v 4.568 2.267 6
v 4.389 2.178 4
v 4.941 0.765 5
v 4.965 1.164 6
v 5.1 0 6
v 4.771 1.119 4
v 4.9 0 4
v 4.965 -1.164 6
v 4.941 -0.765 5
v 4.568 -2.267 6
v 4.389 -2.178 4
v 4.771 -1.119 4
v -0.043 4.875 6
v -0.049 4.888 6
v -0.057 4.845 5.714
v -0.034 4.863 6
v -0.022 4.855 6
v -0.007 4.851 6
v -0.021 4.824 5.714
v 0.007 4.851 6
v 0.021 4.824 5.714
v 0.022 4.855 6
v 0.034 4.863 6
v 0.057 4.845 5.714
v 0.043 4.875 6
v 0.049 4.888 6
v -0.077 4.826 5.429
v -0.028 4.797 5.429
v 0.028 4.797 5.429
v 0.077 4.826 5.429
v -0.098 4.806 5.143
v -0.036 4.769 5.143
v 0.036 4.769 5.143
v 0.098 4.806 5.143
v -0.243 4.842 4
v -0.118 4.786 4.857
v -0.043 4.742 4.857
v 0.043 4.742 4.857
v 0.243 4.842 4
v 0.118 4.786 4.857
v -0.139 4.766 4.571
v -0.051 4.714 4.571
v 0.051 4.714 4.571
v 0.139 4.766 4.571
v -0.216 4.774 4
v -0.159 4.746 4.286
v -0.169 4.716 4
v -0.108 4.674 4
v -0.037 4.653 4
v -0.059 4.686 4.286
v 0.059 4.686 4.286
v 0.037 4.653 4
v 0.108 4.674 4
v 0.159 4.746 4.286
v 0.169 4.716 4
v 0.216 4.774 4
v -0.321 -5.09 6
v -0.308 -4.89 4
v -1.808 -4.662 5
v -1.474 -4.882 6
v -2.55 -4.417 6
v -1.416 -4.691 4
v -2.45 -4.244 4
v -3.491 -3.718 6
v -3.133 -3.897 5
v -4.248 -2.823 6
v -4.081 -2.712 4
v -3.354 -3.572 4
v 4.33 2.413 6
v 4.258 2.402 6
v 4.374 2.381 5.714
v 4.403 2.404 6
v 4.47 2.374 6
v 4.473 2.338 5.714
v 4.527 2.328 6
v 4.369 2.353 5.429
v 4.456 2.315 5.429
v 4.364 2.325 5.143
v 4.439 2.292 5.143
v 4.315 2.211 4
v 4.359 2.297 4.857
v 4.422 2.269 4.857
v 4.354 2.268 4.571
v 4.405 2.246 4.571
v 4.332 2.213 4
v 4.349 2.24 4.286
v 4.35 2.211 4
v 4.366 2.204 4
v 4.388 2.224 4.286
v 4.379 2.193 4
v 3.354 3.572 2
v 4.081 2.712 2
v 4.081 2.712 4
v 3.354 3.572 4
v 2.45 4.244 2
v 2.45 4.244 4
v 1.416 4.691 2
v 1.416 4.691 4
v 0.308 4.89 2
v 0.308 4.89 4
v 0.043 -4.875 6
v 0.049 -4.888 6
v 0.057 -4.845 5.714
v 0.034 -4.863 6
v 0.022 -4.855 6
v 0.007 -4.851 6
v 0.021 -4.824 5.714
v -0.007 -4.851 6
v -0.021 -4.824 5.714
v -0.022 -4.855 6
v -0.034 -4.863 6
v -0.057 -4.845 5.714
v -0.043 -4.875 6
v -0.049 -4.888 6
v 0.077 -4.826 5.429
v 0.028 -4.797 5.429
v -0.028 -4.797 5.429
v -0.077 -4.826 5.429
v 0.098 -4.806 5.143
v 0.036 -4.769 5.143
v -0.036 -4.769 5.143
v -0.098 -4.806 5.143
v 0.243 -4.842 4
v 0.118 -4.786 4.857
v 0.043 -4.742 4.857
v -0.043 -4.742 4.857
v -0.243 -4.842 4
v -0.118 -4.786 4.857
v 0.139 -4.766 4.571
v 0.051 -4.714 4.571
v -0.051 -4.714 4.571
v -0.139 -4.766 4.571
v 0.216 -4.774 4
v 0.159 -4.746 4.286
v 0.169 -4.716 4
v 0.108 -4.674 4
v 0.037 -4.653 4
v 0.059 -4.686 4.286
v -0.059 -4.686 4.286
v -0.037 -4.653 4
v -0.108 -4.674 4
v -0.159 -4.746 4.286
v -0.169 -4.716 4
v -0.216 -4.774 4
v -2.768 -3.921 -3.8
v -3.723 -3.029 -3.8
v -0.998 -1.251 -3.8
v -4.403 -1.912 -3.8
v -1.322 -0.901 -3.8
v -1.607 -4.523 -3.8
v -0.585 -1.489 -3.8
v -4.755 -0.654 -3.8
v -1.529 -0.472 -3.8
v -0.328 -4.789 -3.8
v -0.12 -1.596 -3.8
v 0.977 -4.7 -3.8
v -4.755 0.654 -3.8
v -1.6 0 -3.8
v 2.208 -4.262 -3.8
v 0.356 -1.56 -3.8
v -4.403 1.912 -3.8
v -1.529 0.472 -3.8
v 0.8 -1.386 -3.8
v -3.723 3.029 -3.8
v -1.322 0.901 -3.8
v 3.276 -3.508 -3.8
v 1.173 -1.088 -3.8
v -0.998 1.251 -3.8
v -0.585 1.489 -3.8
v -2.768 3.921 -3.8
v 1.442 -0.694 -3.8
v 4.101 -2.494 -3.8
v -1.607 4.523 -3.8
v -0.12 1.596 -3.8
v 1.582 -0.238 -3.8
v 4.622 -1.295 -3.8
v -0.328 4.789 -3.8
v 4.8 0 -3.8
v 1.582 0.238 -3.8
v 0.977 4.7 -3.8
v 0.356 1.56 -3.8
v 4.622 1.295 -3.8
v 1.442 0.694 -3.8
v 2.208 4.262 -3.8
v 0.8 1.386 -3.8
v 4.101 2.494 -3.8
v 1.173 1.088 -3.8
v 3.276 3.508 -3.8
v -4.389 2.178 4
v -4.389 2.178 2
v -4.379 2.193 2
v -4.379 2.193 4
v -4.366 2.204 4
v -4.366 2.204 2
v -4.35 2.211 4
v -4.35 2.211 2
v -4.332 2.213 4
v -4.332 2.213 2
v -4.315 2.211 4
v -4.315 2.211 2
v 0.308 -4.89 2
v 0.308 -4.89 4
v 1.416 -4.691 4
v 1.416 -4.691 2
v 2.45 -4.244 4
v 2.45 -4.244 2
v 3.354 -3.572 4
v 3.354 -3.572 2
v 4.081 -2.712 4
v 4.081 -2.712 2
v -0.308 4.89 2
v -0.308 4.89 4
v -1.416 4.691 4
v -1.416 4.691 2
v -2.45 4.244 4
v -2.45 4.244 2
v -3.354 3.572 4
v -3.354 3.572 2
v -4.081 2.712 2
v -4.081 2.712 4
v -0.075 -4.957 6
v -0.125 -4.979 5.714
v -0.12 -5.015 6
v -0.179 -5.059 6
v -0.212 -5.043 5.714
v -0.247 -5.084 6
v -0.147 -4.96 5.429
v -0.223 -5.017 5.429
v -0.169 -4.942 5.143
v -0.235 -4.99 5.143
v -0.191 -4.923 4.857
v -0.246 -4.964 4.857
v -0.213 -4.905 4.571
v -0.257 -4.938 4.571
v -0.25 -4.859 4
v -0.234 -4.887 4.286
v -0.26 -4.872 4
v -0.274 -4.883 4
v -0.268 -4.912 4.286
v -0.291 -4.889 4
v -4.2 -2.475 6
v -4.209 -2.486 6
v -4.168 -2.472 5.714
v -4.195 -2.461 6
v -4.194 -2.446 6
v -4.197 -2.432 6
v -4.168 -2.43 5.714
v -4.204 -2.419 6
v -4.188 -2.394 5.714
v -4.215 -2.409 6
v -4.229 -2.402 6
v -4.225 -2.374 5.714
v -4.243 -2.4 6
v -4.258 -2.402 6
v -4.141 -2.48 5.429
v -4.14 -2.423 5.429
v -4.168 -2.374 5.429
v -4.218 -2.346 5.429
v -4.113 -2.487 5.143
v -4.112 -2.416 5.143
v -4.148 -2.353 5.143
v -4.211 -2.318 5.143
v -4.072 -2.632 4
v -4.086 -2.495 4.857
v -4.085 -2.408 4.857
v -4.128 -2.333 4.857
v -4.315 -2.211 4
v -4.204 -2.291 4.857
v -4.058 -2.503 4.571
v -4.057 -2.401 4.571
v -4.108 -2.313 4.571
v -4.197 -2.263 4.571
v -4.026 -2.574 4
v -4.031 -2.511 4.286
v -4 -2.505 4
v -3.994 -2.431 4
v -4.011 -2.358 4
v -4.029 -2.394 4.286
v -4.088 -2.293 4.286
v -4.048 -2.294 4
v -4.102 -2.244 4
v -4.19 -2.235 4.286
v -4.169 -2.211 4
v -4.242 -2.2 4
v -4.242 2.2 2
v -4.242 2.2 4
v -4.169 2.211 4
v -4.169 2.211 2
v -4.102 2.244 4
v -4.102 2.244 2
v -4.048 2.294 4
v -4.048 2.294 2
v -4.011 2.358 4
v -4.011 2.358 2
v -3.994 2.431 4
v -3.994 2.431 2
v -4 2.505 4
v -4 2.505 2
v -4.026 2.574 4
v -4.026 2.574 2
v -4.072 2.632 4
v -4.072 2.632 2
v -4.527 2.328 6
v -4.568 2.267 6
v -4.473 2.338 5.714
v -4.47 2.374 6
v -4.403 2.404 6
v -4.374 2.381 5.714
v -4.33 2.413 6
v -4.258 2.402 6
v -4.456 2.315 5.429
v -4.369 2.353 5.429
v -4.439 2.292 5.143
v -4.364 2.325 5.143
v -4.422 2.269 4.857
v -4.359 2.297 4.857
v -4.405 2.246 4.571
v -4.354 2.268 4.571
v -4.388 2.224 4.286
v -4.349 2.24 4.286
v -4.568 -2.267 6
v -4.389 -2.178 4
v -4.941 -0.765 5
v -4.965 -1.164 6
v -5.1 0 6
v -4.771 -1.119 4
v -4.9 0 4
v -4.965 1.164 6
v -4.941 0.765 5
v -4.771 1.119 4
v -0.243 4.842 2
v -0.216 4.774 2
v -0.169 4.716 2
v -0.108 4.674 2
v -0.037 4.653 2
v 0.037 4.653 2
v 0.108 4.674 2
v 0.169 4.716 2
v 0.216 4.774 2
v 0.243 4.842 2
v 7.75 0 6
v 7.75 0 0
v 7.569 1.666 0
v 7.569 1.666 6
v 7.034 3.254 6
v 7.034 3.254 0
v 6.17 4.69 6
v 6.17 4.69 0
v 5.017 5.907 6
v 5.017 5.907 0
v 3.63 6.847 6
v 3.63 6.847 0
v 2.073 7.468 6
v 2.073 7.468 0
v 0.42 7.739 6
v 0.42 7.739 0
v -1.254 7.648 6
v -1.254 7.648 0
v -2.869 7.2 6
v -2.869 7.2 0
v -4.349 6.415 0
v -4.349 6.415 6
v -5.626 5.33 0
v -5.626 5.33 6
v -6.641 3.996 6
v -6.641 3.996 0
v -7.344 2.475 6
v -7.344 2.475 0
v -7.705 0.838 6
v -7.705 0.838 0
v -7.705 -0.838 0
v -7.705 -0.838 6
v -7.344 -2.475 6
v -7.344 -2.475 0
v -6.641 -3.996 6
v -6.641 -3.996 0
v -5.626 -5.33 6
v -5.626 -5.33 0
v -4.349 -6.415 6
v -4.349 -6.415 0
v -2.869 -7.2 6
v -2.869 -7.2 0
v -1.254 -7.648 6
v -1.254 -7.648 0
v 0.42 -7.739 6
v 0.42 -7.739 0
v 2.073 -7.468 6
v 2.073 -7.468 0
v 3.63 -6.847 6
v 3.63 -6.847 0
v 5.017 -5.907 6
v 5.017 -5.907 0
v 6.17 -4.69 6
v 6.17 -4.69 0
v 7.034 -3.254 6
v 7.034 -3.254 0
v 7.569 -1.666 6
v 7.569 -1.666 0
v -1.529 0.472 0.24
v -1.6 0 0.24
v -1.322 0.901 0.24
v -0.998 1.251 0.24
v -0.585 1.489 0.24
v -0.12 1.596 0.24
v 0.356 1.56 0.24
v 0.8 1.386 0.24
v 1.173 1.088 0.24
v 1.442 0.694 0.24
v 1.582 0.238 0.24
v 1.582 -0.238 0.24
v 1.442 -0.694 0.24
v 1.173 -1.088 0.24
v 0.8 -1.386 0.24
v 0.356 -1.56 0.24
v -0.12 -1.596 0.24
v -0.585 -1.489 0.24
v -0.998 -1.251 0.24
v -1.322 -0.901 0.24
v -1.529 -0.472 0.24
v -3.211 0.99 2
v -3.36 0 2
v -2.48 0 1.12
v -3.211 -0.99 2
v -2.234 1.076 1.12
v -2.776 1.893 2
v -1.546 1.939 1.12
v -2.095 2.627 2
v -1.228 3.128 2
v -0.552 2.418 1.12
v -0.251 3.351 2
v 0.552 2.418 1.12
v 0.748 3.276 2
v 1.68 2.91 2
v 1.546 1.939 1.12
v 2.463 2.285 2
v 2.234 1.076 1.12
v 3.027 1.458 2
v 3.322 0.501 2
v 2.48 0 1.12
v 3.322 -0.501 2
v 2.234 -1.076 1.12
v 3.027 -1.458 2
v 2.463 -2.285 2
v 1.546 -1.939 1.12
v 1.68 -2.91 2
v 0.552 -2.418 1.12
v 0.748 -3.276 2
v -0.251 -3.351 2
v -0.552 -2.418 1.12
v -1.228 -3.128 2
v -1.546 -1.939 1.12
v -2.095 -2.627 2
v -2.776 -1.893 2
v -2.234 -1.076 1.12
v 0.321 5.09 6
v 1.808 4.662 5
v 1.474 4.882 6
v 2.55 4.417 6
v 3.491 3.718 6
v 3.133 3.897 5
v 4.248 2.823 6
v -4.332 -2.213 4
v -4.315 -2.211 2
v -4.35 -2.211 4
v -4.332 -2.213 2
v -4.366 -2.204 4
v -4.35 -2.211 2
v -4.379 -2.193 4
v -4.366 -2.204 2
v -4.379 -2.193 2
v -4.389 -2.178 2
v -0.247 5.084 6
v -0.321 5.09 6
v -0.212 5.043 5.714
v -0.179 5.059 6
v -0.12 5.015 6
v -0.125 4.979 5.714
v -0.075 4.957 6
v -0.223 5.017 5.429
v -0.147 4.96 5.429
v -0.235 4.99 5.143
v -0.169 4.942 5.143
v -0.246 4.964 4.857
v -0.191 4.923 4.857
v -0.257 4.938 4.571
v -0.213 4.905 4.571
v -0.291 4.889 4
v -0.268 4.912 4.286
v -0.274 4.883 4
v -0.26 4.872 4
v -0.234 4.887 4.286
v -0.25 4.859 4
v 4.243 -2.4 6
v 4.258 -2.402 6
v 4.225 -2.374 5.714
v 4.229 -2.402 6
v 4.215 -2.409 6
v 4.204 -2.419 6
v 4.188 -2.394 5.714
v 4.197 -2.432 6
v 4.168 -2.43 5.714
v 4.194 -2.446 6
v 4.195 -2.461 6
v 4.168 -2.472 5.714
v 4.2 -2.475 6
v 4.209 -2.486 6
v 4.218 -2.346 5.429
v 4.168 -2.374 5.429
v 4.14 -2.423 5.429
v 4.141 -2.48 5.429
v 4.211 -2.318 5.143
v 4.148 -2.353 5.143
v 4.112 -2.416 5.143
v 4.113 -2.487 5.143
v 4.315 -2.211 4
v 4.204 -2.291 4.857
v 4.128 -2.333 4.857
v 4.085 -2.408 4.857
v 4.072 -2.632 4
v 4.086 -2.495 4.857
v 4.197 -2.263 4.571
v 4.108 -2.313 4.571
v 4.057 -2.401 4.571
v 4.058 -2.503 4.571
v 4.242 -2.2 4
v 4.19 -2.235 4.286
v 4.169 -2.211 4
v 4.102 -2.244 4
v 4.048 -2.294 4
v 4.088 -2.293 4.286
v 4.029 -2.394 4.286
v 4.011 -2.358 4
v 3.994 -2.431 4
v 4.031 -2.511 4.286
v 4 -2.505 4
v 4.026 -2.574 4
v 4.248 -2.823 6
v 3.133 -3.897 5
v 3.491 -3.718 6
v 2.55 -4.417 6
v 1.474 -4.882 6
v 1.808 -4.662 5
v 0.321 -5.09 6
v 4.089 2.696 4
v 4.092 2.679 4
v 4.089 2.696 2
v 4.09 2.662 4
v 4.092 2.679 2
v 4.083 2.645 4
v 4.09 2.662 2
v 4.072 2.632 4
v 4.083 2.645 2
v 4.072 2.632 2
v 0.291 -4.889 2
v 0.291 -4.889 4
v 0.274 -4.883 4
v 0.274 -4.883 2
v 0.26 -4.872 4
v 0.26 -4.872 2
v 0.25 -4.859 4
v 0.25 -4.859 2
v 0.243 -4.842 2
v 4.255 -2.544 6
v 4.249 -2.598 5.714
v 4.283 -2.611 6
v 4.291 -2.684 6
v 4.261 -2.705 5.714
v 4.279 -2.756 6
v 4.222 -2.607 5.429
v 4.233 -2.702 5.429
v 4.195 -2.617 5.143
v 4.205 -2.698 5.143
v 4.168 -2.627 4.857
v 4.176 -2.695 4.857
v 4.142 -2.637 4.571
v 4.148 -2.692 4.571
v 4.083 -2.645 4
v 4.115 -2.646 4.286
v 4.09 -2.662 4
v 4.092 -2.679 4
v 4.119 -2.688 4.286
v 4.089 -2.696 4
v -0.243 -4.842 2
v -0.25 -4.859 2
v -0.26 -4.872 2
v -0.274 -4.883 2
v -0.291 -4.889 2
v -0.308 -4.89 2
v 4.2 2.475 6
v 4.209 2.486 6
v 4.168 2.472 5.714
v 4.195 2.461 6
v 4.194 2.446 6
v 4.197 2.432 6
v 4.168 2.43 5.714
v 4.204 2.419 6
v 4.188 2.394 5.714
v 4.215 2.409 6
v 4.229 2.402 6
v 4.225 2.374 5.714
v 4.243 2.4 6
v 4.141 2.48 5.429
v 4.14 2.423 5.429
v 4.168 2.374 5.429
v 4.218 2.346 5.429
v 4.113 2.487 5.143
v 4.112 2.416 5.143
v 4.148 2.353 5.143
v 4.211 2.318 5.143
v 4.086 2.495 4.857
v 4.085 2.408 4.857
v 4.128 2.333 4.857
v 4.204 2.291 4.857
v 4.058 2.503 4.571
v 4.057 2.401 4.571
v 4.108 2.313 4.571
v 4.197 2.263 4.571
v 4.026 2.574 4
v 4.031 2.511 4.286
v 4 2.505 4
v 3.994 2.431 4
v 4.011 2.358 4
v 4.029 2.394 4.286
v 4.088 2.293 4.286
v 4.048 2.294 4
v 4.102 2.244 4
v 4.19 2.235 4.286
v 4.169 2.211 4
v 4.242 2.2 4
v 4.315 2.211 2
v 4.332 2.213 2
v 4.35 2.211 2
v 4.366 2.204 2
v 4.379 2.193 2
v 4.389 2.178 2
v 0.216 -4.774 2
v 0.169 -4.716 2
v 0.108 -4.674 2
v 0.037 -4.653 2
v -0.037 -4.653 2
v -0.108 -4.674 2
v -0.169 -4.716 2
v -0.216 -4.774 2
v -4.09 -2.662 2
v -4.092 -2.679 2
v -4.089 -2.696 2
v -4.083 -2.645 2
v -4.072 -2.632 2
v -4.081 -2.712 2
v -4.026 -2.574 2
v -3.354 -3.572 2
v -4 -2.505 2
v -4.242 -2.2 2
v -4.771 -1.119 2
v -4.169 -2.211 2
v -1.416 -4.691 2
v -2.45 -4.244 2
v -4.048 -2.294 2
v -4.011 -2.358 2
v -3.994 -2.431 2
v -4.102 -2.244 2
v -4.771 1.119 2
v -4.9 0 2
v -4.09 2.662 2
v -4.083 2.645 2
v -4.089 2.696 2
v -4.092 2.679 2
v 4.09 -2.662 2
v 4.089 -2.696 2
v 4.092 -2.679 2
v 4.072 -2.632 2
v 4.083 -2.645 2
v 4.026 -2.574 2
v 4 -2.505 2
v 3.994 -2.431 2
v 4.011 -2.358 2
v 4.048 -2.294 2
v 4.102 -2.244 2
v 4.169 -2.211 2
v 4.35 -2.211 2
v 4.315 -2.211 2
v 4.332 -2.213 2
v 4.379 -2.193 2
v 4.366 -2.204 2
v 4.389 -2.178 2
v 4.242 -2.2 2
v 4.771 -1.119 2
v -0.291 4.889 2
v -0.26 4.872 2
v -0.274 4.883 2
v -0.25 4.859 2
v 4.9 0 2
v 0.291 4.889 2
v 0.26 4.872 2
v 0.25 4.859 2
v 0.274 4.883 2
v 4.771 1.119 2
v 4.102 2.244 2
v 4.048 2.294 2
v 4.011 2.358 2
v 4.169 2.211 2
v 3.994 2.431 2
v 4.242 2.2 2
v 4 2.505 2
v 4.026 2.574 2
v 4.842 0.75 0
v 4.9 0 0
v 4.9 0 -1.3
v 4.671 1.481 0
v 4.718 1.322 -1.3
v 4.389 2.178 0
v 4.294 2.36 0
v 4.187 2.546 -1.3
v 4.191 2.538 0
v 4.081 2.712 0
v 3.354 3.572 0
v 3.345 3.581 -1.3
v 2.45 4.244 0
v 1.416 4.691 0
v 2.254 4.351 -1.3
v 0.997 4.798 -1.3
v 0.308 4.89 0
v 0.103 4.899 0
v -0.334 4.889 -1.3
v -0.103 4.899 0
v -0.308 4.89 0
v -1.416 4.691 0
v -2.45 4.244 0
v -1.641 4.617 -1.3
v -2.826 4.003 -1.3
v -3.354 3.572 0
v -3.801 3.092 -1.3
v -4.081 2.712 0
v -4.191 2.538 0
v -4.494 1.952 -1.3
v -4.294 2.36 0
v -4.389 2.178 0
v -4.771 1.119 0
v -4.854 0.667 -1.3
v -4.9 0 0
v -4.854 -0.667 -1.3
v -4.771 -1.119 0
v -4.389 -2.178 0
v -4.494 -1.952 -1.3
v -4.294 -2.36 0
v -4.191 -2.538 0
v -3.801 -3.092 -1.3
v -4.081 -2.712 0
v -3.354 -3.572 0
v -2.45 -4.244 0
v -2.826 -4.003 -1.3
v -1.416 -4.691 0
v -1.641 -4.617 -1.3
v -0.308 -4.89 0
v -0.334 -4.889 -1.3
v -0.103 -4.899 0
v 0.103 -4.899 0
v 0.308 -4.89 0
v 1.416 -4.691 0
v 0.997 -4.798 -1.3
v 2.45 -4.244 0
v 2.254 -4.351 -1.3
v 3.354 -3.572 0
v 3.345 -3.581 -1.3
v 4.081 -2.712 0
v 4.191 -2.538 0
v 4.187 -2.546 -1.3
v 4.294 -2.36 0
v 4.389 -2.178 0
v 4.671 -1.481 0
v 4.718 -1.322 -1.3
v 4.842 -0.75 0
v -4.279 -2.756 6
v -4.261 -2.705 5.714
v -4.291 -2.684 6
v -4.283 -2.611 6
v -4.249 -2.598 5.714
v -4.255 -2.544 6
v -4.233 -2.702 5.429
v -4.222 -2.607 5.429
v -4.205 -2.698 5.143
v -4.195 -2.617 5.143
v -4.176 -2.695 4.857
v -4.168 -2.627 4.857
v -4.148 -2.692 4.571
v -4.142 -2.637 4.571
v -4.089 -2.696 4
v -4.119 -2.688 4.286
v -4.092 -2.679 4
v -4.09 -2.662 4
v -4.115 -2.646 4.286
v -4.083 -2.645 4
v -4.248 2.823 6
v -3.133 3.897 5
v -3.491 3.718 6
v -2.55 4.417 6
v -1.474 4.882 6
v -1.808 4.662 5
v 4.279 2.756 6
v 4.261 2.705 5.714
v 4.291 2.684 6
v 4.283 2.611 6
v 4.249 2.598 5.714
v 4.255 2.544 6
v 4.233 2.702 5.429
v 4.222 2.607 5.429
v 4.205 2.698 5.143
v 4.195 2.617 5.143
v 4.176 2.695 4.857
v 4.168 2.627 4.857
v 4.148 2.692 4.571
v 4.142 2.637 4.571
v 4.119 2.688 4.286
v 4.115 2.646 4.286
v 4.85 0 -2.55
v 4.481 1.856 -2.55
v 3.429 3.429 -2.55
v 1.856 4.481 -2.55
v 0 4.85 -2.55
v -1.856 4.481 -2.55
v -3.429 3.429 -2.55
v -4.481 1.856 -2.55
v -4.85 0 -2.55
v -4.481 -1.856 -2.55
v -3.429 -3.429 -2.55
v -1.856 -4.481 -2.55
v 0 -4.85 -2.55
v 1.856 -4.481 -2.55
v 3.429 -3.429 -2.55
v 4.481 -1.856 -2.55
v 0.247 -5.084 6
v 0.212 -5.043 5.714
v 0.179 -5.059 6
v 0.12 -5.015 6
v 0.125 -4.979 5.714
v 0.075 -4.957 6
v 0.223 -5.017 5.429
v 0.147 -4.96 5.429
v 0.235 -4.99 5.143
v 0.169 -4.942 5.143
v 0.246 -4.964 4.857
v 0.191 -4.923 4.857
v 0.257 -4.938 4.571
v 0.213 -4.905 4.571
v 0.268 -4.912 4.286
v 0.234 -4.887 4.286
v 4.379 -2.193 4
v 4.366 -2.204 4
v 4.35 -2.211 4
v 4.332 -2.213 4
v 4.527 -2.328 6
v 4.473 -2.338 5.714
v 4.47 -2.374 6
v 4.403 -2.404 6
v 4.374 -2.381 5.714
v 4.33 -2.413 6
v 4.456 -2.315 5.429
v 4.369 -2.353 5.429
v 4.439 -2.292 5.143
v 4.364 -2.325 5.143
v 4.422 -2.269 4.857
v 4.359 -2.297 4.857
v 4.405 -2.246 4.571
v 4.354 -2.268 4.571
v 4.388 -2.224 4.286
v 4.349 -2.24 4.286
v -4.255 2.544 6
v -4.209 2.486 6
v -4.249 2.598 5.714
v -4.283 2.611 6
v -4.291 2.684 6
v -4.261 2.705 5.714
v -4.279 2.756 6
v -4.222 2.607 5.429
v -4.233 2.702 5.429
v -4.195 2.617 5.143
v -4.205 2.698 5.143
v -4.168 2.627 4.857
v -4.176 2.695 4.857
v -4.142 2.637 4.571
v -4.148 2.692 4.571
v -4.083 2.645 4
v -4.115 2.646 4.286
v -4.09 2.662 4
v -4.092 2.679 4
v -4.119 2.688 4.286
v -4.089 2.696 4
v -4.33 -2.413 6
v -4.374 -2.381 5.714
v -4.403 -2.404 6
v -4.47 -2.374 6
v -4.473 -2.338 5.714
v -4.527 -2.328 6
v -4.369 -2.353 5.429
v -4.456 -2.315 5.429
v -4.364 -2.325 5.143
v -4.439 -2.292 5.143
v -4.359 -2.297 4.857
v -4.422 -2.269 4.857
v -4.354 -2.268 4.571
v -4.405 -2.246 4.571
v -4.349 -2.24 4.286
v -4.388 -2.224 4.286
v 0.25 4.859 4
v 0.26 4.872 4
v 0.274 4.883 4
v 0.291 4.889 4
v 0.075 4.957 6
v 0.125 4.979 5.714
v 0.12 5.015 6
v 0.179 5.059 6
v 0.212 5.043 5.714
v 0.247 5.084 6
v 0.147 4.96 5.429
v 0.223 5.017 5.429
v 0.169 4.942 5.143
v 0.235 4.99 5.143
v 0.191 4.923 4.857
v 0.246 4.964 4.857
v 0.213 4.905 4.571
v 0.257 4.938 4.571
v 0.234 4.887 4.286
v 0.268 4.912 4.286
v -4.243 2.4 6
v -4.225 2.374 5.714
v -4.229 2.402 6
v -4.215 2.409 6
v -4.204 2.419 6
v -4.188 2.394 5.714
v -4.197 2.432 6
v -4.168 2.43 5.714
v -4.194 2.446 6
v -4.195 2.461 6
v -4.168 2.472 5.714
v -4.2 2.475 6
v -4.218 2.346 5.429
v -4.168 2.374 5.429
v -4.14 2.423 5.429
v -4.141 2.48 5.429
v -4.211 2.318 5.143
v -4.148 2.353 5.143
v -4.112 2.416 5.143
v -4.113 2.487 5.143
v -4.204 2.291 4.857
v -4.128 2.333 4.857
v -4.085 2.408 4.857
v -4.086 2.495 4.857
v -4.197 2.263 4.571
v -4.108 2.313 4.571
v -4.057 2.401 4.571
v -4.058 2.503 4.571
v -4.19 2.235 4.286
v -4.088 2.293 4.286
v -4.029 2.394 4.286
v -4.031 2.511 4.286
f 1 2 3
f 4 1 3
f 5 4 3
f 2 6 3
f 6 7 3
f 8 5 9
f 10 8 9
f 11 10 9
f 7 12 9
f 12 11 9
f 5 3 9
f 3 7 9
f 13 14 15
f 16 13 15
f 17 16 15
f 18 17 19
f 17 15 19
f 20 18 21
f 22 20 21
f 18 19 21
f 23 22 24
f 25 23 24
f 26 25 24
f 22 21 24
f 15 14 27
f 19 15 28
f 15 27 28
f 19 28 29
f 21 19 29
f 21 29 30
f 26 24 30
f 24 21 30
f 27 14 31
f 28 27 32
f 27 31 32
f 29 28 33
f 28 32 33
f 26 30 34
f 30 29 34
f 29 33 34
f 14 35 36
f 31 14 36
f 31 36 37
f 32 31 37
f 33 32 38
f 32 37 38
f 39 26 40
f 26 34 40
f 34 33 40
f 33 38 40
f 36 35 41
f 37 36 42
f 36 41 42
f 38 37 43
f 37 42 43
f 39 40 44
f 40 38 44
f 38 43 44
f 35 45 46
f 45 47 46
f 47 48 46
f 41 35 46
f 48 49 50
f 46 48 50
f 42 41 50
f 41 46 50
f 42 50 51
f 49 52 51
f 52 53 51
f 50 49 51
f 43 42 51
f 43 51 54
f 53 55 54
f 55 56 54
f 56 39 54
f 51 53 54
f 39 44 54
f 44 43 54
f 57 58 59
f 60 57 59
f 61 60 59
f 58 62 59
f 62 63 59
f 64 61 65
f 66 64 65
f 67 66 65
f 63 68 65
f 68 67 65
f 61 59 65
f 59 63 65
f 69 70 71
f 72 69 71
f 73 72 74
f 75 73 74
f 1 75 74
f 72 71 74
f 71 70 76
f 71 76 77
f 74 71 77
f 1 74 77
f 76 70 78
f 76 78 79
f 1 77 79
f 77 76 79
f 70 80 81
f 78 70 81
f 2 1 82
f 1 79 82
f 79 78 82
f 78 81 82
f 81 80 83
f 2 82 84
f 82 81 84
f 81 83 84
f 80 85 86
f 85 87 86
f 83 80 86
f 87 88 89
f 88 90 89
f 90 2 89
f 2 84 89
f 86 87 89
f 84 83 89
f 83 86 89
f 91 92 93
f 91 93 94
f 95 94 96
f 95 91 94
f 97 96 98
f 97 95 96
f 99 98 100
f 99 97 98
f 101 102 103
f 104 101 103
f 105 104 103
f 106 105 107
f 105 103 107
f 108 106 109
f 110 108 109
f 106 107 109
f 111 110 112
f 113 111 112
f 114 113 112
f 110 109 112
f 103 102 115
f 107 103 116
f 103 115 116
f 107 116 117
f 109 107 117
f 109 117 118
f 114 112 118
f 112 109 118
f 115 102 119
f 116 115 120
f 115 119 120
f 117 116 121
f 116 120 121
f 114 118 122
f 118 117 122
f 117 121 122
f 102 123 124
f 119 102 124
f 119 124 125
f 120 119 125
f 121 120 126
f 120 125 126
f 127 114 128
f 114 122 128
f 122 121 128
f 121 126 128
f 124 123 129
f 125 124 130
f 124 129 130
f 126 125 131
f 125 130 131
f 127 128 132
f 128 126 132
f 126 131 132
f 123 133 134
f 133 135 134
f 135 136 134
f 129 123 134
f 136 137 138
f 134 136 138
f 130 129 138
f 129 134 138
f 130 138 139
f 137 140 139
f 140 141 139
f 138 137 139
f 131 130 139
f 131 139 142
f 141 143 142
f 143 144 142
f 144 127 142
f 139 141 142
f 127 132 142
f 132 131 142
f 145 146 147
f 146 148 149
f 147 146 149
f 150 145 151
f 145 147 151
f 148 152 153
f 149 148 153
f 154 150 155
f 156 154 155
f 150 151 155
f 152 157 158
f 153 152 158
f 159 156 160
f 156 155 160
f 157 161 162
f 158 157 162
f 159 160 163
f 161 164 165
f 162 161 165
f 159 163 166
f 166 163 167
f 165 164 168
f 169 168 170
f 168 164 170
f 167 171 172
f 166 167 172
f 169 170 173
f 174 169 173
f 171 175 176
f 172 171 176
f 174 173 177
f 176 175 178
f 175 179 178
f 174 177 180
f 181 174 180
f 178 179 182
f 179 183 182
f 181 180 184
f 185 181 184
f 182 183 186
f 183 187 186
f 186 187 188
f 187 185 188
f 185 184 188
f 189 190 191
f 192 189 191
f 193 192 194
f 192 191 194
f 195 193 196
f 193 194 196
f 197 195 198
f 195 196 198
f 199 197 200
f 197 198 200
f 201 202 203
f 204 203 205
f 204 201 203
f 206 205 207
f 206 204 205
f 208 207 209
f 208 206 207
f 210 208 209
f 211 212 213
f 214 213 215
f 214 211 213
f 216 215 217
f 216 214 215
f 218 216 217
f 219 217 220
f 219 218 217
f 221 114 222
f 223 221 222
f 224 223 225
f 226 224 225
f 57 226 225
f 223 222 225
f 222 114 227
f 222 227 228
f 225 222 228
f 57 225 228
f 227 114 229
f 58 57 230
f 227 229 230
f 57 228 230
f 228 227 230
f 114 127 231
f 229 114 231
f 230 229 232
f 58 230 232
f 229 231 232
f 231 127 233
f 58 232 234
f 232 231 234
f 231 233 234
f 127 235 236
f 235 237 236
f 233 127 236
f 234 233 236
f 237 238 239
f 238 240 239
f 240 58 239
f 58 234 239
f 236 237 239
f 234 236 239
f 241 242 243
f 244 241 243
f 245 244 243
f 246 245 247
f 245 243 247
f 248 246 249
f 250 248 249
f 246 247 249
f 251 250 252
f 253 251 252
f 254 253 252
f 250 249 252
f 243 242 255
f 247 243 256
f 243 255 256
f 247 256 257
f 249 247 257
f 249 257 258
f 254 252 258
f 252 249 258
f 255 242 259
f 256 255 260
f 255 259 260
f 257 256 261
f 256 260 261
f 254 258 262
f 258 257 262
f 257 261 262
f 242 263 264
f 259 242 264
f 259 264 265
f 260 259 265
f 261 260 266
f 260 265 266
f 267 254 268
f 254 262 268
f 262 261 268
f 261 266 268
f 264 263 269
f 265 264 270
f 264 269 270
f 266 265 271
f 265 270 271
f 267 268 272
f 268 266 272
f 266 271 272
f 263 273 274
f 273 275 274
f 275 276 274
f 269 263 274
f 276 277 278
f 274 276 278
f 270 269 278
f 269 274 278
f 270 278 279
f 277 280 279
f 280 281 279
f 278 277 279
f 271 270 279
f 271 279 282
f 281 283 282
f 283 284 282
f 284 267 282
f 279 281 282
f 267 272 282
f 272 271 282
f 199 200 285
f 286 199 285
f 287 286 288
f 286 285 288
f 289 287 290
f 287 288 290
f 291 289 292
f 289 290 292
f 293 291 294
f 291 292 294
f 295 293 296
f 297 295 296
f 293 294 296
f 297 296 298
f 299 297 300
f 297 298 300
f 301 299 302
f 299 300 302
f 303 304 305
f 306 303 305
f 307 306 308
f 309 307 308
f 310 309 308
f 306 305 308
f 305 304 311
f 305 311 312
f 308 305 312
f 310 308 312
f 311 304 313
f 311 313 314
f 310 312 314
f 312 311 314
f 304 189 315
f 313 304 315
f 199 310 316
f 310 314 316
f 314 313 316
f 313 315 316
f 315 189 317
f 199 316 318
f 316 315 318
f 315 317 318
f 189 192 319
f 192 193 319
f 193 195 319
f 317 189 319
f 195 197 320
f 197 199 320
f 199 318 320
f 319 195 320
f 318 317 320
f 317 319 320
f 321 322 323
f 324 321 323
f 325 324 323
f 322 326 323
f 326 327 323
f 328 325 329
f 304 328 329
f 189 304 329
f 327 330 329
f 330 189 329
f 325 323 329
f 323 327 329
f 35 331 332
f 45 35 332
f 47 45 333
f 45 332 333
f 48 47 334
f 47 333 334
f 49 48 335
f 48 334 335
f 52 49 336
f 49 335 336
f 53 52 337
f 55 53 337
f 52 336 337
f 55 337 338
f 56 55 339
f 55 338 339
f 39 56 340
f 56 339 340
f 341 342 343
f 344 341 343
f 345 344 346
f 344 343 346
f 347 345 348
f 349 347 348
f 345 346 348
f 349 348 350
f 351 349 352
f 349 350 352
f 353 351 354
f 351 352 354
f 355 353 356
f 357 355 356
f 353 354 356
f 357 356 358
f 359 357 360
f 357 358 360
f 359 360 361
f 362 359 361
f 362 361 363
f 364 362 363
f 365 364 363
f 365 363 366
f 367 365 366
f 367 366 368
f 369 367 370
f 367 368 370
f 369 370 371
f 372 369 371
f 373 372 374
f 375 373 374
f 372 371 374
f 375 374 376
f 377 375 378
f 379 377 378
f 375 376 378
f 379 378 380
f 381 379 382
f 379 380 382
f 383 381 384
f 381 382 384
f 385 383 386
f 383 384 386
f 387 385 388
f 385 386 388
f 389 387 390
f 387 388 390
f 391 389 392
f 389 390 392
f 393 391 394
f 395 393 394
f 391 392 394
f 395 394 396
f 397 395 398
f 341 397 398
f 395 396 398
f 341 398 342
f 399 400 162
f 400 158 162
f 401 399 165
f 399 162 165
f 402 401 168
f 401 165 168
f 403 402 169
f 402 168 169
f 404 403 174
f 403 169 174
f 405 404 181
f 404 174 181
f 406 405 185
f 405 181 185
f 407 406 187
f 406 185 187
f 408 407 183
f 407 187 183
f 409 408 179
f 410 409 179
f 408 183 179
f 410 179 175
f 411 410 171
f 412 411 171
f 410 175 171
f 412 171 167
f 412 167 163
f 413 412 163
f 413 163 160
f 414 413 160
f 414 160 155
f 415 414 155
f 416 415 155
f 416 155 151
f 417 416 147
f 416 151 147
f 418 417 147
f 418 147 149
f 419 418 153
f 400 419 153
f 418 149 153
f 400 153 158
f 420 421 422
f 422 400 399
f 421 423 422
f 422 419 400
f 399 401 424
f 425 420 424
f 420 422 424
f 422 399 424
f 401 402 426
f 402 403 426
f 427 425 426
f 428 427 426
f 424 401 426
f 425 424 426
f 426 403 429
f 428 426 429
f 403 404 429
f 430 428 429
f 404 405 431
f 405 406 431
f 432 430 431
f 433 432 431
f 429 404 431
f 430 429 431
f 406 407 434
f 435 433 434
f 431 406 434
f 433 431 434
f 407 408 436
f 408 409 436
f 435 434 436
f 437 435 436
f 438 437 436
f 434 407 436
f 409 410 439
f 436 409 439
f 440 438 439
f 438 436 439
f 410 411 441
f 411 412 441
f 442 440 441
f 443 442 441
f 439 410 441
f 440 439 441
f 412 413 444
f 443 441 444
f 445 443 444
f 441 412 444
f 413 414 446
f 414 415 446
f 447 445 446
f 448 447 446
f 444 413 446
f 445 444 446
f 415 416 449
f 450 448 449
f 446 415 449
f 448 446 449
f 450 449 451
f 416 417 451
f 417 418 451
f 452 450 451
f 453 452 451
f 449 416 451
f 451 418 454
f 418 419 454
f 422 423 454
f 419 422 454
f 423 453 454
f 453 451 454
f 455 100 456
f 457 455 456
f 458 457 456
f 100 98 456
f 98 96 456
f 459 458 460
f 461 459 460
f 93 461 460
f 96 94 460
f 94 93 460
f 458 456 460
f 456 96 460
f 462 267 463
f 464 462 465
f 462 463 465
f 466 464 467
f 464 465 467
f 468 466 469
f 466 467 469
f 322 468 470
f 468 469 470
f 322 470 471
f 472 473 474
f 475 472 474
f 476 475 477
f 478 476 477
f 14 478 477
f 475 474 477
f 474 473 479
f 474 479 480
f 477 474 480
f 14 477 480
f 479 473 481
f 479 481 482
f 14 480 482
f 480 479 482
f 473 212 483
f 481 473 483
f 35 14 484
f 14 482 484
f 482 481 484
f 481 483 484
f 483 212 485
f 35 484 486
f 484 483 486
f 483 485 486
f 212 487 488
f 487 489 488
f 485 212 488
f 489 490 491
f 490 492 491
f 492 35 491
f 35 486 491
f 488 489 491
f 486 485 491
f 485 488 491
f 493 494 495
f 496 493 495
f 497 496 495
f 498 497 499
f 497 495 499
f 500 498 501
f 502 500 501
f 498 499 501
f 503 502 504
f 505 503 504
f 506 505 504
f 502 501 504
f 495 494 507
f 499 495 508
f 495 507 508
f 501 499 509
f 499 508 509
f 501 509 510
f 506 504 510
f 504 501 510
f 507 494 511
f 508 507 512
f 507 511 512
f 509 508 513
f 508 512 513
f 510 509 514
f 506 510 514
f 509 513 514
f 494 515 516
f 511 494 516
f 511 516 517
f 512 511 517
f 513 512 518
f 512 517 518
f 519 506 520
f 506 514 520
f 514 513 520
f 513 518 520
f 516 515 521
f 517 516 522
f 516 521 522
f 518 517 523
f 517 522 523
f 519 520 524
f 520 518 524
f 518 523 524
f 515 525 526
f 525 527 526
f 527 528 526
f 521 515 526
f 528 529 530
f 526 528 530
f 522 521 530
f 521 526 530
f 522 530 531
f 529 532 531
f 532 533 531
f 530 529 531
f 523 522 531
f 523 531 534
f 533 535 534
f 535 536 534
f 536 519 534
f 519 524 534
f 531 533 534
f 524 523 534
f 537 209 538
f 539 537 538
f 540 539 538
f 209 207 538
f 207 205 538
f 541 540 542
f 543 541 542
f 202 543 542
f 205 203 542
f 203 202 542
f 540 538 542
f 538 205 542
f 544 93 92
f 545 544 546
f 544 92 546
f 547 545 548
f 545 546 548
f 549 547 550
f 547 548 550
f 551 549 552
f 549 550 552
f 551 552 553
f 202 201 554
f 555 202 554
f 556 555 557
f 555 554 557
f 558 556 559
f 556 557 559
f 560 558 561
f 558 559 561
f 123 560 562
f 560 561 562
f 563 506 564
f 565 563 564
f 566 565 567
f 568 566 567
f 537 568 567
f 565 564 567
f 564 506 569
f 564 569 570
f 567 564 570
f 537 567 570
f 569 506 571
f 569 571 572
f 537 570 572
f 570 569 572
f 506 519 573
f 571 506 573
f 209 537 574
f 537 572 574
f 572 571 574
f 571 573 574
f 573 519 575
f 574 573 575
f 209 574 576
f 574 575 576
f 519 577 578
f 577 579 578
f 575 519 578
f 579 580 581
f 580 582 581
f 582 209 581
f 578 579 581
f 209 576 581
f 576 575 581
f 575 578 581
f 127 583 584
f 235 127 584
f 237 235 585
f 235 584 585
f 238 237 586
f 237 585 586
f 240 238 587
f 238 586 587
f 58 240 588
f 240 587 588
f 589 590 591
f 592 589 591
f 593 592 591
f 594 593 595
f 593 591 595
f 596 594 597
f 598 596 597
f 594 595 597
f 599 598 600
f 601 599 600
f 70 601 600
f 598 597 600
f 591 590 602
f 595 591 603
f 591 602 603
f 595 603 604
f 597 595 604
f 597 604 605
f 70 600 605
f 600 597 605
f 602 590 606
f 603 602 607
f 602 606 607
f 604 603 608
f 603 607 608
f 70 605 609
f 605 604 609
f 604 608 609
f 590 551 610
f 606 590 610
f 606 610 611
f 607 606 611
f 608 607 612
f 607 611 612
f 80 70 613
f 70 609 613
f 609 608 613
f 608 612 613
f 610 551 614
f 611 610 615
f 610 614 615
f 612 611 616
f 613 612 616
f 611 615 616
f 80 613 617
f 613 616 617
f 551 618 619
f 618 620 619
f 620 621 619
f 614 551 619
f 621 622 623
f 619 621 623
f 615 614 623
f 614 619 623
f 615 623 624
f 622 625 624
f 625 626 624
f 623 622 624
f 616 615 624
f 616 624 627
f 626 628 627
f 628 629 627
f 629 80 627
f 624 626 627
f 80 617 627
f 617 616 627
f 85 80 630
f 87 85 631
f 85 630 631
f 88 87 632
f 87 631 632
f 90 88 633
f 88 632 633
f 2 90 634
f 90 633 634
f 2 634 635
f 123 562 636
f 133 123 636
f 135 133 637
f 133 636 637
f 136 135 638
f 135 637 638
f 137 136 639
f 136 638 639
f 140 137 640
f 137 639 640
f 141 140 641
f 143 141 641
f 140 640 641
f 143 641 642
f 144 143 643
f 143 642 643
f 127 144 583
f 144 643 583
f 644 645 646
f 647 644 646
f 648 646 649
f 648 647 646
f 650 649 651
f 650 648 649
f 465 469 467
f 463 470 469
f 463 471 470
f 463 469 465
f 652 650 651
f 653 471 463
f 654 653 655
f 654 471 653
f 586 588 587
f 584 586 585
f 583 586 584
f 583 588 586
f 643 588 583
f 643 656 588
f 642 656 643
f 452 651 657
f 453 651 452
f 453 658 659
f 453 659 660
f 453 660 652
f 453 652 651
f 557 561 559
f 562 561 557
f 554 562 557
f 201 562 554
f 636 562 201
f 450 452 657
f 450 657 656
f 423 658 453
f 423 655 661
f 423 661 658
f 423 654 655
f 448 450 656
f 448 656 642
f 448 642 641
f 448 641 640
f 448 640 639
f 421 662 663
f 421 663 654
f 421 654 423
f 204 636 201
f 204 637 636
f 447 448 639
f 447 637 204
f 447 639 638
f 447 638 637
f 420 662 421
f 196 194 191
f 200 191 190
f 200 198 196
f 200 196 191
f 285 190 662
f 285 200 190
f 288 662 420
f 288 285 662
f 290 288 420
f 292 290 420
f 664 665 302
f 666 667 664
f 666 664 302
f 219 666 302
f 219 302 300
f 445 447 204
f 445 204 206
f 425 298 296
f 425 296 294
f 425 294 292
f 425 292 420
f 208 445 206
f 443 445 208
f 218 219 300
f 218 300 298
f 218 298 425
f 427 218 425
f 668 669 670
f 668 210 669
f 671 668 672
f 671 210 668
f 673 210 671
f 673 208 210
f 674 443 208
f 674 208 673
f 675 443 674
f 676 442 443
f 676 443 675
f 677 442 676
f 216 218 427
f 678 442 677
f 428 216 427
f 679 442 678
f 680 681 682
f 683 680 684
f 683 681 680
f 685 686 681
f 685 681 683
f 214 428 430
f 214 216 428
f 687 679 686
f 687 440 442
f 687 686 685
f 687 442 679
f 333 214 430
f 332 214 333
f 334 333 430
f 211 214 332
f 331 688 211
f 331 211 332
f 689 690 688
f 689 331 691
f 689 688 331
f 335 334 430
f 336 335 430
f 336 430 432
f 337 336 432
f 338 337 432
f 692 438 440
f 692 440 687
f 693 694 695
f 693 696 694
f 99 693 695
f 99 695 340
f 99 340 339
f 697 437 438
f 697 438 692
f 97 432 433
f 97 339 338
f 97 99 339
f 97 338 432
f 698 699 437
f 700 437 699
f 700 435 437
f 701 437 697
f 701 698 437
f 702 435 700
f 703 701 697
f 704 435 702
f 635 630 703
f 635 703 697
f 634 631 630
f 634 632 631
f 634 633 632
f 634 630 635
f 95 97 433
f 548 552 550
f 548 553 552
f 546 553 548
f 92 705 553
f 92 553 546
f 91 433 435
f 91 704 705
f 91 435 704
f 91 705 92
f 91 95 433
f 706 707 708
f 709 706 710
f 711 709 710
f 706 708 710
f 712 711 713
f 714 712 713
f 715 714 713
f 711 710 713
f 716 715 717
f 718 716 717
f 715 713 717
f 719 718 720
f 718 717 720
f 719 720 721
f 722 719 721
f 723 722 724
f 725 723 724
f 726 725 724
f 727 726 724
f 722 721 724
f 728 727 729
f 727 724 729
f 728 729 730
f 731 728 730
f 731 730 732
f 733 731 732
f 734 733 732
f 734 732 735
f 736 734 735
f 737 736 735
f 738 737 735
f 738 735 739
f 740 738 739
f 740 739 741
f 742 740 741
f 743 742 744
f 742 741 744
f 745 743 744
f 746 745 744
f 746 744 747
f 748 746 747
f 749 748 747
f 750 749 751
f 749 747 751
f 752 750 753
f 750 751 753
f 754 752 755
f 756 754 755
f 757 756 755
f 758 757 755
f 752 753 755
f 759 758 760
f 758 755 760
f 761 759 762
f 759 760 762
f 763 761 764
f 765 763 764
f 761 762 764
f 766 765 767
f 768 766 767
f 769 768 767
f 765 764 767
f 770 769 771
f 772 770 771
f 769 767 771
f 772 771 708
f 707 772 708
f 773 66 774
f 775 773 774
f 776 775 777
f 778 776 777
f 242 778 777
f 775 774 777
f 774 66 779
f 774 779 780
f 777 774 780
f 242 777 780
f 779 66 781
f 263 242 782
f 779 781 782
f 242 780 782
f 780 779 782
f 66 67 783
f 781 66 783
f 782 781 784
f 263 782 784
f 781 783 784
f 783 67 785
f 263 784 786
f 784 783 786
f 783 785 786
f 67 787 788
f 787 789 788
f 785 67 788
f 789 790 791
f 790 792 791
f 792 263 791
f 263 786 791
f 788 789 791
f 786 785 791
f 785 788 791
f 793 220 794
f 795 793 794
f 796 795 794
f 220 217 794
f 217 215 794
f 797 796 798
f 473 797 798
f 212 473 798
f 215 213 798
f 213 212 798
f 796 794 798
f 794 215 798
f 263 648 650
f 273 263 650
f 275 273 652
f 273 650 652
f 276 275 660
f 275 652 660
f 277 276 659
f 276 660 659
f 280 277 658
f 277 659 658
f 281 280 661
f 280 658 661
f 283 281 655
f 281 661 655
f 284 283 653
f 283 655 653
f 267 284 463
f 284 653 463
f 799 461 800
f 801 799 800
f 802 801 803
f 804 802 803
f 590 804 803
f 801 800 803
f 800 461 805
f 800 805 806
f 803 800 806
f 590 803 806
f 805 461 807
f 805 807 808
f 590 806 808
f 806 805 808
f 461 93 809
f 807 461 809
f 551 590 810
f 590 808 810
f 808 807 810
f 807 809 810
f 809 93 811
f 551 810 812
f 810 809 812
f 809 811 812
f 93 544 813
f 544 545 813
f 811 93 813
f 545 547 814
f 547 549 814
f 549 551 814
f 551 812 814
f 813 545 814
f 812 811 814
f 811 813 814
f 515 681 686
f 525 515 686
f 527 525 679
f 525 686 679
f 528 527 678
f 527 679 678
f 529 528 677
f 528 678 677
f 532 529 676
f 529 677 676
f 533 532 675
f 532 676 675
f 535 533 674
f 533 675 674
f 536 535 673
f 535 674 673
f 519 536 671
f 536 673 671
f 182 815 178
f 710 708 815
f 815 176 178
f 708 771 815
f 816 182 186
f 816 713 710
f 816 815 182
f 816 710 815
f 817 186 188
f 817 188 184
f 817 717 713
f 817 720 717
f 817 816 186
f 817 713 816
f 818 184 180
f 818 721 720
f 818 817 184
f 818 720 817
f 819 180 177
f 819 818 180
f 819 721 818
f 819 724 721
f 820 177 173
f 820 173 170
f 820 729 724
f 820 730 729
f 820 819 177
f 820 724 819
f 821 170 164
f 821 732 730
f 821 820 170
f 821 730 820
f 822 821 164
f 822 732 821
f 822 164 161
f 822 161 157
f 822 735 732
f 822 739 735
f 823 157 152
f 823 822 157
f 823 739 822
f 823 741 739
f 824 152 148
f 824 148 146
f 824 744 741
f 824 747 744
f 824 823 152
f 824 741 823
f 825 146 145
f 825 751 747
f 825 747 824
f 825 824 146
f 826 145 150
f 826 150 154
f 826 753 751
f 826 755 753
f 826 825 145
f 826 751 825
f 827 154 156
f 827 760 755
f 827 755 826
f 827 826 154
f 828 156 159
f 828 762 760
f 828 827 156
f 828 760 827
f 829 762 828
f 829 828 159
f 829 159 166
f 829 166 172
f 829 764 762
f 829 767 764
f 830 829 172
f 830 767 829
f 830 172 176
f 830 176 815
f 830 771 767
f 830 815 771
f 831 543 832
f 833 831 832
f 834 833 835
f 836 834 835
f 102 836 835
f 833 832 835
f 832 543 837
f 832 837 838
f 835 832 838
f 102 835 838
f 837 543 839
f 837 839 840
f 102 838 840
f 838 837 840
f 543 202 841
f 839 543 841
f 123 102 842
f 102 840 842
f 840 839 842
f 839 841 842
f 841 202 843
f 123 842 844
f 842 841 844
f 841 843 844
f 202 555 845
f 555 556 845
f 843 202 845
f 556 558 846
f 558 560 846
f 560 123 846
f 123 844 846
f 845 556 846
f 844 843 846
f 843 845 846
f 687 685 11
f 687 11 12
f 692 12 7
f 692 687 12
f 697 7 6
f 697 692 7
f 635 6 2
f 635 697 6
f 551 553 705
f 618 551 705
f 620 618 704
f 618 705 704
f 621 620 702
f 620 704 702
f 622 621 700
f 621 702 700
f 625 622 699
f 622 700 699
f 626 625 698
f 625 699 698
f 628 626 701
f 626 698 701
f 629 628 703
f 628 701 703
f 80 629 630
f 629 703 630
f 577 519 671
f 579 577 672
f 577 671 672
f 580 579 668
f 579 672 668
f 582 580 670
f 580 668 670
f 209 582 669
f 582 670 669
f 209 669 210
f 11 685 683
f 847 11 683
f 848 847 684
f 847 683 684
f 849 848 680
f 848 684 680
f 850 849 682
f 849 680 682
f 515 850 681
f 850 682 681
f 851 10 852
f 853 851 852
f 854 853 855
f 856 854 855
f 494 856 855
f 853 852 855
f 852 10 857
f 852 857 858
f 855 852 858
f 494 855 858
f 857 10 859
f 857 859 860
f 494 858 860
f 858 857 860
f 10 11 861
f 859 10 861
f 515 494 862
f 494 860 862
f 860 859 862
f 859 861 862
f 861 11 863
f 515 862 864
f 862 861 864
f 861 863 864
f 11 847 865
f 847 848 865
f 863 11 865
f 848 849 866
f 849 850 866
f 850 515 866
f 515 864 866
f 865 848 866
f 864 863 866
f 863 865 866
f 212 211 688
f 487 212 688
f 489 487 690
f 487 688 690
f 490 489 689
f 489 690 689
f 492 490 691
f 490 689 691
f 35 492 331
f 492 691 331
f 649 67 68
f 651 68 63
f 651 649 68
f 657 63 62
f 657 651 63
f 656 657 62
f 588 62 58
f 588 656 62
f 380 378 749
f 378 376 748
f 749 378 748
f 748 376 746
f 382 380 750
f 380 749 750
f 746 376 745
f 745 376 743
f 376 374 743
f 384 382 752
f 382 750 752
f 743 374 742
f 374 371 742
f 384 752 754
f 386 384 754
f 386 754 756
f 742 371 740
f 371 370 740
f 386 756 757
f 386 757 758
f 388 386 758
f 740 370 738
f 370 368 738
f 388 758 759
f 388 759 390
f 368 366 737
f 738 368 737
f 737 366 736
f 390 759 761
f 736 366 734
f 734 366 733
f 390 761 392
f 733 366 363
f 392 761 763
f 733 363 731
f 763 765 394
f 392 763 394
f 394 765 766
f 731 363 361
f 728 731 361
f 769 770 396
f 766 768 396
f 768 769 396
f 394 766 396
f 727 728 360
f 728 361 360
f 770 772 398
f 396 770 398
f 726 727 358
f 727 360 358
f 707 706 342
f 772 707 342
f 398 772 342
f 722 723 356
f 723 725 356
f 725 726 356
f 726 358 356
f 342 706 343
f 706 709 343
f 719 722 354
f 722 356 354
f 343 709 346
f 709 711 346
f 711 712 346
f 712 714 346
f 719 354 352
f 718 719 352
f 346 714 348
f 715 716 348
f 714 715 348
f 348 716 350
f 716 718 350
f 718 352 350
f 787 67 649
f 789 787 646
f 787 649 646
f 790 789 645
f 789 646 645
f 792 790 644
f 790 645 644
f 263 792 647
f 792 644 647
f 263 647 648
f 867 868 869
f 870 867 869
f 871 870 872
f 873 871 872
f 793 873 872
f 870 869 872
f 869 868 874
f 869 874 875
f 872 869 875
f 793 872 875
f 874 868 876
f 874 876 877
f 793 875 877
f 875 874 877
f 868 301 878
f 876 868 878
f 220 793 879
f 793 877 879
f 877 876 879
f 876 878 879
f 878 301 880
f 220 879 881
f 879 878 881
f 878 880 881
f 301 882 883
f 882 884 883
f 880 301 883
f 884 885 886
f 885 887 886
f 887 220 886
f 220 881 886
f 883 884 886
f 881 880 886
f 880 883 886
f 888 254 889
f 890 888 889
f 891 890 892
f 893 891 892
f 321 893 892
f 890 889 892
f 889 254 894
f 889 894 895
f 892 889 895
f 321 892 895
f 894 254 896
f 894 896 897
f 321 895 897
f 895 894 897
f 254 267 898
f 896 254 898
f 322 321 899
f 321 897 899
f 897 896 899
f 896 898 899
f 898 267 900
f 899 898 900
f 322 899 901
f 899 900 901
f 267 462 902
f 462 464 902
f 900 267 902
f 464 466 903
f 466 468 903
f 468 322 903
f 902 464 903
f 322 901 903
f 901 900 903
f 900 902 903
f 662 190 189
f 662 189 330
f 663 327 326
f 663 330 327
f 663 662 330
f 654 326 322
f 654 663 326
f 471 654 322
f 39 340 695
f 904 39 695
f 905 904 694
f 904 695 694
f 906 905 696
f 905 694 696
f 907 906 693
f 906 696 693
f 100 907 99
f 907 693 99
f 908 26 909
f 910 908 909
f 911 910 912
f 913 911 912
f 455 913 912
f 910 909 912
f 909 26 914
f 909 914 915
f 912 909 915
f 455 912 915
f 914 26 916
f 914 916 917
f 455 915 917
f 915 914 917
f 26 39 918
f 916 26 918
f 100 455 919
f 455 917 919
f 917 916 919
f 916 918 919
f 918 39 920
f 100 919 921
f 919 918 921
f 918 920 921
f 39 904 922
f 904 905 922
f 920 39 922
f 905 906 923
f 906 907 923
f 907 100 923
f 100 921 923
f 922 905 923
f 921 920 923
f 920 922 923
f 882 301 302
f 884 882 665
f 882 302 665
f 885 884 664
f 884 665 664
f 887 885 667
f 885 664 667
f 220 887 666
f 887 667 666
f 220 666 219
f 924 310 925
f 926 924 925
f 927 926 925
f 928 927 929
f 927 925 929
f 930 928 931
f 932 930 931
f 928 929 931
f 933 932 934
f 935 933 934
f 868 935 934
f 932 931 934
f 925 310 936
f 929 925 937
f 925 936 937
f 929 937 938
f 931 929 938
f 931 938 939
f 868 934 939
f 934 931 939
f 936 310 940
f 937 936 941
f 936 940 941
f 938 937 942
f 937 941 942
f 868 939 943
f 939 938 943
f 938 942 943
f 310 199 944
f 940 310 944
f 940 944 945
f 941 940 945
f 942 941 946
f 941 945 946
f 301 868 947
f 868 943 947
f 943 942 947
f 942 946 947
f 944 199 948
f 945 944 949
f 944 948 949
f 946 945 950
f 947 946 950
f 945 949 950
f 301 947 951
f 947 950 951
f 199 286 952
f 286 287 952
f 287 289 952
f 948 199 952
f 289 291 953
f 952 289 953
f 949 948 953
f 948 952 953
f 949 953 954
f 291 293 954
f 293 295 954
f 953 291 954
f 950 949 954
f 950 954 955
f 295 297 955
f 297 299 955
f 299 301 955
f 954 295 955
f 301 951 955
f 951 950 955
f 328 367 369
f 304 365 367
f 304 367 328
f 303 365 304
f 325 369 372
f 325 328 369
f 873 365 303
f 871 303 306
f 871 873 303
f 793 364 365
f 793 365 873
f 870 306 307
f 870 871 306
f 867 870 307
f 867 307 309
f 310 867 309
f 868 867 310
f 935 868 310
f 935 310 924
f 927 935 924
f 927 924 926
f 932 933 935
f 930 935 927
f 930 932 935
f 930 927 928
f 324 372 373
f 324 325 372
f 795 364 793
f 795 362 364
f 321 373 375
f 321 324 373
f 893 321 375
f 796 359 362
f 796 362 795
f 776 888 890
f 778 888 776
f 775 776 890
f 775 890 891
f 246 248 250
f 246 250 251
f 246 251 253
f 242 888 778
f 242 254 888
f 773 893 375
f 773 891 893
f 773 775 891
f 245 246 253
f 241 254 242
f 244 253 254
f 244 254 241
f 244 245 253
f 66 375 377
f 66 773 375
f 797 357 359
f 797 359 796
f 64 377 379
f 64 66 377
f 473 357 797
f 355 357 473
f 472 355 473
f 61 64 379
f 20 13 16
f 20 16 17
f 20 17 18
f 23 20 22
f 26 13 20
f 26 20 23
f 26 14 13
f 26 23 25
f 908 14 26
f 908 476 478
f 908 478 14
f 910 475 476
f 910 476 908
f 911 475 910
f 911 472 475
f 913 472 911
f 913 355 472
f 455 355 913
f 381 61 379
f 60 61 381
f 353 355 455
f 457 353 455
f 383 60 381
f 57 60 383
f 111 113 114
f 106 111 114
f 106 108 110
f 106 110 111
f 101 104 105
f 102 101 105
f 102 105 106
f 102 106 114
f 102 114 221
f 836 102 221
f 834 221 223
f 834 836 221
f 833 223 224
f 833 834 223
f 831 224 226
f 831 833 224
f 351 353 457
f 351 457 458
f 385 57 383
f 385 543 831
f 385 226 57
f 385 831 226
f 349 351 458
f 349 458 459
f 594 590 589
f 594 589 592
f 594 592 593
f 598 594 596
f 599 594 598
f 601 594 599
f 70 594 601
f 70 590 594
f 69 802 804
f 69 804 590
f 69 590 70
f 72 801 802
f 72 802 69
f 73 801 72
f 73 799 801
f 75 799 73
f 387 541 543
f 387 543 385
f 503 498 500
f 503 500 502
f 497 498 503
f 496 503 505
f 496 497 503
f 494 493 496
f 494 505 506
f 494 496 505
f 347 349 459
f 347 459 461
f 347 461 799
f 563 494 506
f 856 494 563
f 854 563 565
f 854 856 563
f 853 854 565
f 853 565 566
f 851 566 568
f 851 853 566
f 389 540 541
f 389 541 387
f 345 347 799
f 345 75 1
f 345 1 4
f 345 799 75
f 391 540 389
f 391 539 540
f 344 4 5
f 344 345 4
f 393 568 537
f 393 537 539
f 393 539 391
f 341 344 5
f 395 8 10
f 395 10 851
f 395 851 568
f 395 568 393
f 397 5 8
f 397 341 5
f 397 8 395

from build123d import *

# Parameters (mm, degrees)
SKETCH1_R                  = 4.9
BOSS_EXTRUDE1_DEPTH        = 2
SKETCH1_3_R                = 7.75
SKETCH1_3_R_2              = 4.9
BOSS_EXTRUDE2_DEPTH        = 6
BOSS_EXTRUDE3_START        = -3.8
SKETCH1_4_R                = 4.9
BOSS_EXTRUDE3_DEPTH        = 3.8
CSK_FOR_SFHCS1_D           = 3.2
CSK_FOR_SFHCS1_CSINK_D     = 6.72
CSK_FOR_SFHCS1_CSINK_ANGLE = 90
BOSS_EXTRUDE4_DEPTH        = 6
CIRPATTERN1_COUNT          = 6
CHAMFER2_SIZE              = 0.2
CHAMFER2_SIZE2             = 2
CHAMFER3_SIZE              = 0.1
CHAMFER3_SIZE2             = 2.5


with BuildPart() as part:
    # Sketch1 → Boss-Extrude1 (new body)
    with BuildSketch(Plane.XY):
        Circle(SKETCH1_R)
    extrude(amount=BOSS_EXTRUDE1_DEPTH)

    # Sketch1<3> → Boss-Extrude2 (add)
    with BuildSketch(Plane.XY):
        Circle(SKETCH1_3_R)
        Circle(SKETCH1_3_R_2, mode=Mode.SUBTRACT)
    extrude(amount=BOSS_EXTRUDE2_DEPTH)

    # Sketch1<4> → Boss-Extrude3 (add)
    with BuildSketch(Plane.XY.offset(BOSS_EXTRUDE3_START)):
        Circle(SKETCH1_4_R)
    extrude(amount=BOSS_EXTRUDE3_DEPTH)

    # CSK for  SFHCS1 (through all)
    with Locations(Plane.XY.offset(2)):
        with Locations((0, 0)):
            CounterSinkHole(CSK_FOR_SFHCS1_D / 2, CSK_FOR_SFHCS1_CSINK_D / 2, counter_sink_angle=CSK_FOR_SFHCS1_CSINK_ANGLE)

    # Sketch1<5> → Boss-Extrude4 (add)
    with BuildSketch(Plane.XY):
        with BuildLine():
            ThreePointArc((0.243261431, 4.842346934), (0.266872757, 4.878154286), (0.308005444, 4.890310077))
            ThreePointArc((0.308005444, 4.890310077), (1.2e-08, 4.9), (-0.308005421, 4.890310078))
            ThreePointArc((-0.308005421, 4.890310078), (-0.266872748, 4.878154279), (-0.243261431, 4.842346934))
            ThreePointArc((-0.243261431, 4.842346934), (0, 4.65), (0.243261431, 4.842346934))
        make_face()
    boss_extrude4 = extrude(amount=BOSS_EXTRUDE4_DEPTH)

    # CirPattern1: Boss-Extrude4 ×6 about axis
    cirpattern1_axis = Axis((0, 0, 0), (0, 0, 1))
    for i in range(1, CIRPATTERN1_COUNT):
        add(boss_extrude4.rotate(cirpattern1_axis, i * 360 / CIRPATTERN1_COUNT))

    # Chamfer2
    chamfer2_edges = [part.edges().sort_by_distance(p)[0] for p in [
        (-4.091169155, -2.670195719, 6),
        (-4.358041914, -2.207958555, 6),
        (-4.027018128, -2.325, 6),
        (2.44999999, -4.243524484, 6),
        (0.266872748, -4.878154279, 6),
        (-0.266872757, -4.878154286, 6),
        (0, -4.65, 6),
        (4.9, -1.2e-08, 6),
        (4.358041903, -2.20795856, 6),
        (4.091169156, -2.67019573, 6),
        (4.027018128, -2.325, 6),
        (2.45000001, 4.243524473, 6),
        (4.091169155, 2.670195719, 6),
        (4.358041914, 2.207958555, 6),
        (4.027018128, 2.325, 6),
        (-2.44999999, 4.243524484, 6),
        (-0.266872748, 4.878154279, 6),
        (0.266872757, 4.878154286, 6),
        (0, 4.65, 6),
        (-4.9, 1.2e-08, 6),
        (-4.358041903, 2.20795856, 6),
        (-4.091169156, 2.67019573, 6),
        (-4.027018128, 2.325, 6),
        (-2.45000001, -4.243524473, 6),
    ]]
    chamfer2_side = [part.faces().sort_by_distance(p)[0] for p in [
        (-7.530796898, 0, 6),
    ]]
    chamfer(chamfer2_edges, length=CHAMFER2_SIZE, length2=CHAMFER2_SIZE2, reference=chamfer2_side[0])

    # Chamfer3
    chamfer3_edges = [part.edges().sort_by_distance(p)[0] for p in [
        (-4.9, 0, -3.8),
    ]]
    chamfer3_side = [part.faces().sort_by_distance(p)[0] for p in [
        (-4.761407071, 0, -3.8),
    ]]
    chamfer(chamfer3_edges, length=CHAMFER3_SIZE, length2=CHAMFER3_SIZE2, reference=chamfer3_side[0])


solid = part.part
